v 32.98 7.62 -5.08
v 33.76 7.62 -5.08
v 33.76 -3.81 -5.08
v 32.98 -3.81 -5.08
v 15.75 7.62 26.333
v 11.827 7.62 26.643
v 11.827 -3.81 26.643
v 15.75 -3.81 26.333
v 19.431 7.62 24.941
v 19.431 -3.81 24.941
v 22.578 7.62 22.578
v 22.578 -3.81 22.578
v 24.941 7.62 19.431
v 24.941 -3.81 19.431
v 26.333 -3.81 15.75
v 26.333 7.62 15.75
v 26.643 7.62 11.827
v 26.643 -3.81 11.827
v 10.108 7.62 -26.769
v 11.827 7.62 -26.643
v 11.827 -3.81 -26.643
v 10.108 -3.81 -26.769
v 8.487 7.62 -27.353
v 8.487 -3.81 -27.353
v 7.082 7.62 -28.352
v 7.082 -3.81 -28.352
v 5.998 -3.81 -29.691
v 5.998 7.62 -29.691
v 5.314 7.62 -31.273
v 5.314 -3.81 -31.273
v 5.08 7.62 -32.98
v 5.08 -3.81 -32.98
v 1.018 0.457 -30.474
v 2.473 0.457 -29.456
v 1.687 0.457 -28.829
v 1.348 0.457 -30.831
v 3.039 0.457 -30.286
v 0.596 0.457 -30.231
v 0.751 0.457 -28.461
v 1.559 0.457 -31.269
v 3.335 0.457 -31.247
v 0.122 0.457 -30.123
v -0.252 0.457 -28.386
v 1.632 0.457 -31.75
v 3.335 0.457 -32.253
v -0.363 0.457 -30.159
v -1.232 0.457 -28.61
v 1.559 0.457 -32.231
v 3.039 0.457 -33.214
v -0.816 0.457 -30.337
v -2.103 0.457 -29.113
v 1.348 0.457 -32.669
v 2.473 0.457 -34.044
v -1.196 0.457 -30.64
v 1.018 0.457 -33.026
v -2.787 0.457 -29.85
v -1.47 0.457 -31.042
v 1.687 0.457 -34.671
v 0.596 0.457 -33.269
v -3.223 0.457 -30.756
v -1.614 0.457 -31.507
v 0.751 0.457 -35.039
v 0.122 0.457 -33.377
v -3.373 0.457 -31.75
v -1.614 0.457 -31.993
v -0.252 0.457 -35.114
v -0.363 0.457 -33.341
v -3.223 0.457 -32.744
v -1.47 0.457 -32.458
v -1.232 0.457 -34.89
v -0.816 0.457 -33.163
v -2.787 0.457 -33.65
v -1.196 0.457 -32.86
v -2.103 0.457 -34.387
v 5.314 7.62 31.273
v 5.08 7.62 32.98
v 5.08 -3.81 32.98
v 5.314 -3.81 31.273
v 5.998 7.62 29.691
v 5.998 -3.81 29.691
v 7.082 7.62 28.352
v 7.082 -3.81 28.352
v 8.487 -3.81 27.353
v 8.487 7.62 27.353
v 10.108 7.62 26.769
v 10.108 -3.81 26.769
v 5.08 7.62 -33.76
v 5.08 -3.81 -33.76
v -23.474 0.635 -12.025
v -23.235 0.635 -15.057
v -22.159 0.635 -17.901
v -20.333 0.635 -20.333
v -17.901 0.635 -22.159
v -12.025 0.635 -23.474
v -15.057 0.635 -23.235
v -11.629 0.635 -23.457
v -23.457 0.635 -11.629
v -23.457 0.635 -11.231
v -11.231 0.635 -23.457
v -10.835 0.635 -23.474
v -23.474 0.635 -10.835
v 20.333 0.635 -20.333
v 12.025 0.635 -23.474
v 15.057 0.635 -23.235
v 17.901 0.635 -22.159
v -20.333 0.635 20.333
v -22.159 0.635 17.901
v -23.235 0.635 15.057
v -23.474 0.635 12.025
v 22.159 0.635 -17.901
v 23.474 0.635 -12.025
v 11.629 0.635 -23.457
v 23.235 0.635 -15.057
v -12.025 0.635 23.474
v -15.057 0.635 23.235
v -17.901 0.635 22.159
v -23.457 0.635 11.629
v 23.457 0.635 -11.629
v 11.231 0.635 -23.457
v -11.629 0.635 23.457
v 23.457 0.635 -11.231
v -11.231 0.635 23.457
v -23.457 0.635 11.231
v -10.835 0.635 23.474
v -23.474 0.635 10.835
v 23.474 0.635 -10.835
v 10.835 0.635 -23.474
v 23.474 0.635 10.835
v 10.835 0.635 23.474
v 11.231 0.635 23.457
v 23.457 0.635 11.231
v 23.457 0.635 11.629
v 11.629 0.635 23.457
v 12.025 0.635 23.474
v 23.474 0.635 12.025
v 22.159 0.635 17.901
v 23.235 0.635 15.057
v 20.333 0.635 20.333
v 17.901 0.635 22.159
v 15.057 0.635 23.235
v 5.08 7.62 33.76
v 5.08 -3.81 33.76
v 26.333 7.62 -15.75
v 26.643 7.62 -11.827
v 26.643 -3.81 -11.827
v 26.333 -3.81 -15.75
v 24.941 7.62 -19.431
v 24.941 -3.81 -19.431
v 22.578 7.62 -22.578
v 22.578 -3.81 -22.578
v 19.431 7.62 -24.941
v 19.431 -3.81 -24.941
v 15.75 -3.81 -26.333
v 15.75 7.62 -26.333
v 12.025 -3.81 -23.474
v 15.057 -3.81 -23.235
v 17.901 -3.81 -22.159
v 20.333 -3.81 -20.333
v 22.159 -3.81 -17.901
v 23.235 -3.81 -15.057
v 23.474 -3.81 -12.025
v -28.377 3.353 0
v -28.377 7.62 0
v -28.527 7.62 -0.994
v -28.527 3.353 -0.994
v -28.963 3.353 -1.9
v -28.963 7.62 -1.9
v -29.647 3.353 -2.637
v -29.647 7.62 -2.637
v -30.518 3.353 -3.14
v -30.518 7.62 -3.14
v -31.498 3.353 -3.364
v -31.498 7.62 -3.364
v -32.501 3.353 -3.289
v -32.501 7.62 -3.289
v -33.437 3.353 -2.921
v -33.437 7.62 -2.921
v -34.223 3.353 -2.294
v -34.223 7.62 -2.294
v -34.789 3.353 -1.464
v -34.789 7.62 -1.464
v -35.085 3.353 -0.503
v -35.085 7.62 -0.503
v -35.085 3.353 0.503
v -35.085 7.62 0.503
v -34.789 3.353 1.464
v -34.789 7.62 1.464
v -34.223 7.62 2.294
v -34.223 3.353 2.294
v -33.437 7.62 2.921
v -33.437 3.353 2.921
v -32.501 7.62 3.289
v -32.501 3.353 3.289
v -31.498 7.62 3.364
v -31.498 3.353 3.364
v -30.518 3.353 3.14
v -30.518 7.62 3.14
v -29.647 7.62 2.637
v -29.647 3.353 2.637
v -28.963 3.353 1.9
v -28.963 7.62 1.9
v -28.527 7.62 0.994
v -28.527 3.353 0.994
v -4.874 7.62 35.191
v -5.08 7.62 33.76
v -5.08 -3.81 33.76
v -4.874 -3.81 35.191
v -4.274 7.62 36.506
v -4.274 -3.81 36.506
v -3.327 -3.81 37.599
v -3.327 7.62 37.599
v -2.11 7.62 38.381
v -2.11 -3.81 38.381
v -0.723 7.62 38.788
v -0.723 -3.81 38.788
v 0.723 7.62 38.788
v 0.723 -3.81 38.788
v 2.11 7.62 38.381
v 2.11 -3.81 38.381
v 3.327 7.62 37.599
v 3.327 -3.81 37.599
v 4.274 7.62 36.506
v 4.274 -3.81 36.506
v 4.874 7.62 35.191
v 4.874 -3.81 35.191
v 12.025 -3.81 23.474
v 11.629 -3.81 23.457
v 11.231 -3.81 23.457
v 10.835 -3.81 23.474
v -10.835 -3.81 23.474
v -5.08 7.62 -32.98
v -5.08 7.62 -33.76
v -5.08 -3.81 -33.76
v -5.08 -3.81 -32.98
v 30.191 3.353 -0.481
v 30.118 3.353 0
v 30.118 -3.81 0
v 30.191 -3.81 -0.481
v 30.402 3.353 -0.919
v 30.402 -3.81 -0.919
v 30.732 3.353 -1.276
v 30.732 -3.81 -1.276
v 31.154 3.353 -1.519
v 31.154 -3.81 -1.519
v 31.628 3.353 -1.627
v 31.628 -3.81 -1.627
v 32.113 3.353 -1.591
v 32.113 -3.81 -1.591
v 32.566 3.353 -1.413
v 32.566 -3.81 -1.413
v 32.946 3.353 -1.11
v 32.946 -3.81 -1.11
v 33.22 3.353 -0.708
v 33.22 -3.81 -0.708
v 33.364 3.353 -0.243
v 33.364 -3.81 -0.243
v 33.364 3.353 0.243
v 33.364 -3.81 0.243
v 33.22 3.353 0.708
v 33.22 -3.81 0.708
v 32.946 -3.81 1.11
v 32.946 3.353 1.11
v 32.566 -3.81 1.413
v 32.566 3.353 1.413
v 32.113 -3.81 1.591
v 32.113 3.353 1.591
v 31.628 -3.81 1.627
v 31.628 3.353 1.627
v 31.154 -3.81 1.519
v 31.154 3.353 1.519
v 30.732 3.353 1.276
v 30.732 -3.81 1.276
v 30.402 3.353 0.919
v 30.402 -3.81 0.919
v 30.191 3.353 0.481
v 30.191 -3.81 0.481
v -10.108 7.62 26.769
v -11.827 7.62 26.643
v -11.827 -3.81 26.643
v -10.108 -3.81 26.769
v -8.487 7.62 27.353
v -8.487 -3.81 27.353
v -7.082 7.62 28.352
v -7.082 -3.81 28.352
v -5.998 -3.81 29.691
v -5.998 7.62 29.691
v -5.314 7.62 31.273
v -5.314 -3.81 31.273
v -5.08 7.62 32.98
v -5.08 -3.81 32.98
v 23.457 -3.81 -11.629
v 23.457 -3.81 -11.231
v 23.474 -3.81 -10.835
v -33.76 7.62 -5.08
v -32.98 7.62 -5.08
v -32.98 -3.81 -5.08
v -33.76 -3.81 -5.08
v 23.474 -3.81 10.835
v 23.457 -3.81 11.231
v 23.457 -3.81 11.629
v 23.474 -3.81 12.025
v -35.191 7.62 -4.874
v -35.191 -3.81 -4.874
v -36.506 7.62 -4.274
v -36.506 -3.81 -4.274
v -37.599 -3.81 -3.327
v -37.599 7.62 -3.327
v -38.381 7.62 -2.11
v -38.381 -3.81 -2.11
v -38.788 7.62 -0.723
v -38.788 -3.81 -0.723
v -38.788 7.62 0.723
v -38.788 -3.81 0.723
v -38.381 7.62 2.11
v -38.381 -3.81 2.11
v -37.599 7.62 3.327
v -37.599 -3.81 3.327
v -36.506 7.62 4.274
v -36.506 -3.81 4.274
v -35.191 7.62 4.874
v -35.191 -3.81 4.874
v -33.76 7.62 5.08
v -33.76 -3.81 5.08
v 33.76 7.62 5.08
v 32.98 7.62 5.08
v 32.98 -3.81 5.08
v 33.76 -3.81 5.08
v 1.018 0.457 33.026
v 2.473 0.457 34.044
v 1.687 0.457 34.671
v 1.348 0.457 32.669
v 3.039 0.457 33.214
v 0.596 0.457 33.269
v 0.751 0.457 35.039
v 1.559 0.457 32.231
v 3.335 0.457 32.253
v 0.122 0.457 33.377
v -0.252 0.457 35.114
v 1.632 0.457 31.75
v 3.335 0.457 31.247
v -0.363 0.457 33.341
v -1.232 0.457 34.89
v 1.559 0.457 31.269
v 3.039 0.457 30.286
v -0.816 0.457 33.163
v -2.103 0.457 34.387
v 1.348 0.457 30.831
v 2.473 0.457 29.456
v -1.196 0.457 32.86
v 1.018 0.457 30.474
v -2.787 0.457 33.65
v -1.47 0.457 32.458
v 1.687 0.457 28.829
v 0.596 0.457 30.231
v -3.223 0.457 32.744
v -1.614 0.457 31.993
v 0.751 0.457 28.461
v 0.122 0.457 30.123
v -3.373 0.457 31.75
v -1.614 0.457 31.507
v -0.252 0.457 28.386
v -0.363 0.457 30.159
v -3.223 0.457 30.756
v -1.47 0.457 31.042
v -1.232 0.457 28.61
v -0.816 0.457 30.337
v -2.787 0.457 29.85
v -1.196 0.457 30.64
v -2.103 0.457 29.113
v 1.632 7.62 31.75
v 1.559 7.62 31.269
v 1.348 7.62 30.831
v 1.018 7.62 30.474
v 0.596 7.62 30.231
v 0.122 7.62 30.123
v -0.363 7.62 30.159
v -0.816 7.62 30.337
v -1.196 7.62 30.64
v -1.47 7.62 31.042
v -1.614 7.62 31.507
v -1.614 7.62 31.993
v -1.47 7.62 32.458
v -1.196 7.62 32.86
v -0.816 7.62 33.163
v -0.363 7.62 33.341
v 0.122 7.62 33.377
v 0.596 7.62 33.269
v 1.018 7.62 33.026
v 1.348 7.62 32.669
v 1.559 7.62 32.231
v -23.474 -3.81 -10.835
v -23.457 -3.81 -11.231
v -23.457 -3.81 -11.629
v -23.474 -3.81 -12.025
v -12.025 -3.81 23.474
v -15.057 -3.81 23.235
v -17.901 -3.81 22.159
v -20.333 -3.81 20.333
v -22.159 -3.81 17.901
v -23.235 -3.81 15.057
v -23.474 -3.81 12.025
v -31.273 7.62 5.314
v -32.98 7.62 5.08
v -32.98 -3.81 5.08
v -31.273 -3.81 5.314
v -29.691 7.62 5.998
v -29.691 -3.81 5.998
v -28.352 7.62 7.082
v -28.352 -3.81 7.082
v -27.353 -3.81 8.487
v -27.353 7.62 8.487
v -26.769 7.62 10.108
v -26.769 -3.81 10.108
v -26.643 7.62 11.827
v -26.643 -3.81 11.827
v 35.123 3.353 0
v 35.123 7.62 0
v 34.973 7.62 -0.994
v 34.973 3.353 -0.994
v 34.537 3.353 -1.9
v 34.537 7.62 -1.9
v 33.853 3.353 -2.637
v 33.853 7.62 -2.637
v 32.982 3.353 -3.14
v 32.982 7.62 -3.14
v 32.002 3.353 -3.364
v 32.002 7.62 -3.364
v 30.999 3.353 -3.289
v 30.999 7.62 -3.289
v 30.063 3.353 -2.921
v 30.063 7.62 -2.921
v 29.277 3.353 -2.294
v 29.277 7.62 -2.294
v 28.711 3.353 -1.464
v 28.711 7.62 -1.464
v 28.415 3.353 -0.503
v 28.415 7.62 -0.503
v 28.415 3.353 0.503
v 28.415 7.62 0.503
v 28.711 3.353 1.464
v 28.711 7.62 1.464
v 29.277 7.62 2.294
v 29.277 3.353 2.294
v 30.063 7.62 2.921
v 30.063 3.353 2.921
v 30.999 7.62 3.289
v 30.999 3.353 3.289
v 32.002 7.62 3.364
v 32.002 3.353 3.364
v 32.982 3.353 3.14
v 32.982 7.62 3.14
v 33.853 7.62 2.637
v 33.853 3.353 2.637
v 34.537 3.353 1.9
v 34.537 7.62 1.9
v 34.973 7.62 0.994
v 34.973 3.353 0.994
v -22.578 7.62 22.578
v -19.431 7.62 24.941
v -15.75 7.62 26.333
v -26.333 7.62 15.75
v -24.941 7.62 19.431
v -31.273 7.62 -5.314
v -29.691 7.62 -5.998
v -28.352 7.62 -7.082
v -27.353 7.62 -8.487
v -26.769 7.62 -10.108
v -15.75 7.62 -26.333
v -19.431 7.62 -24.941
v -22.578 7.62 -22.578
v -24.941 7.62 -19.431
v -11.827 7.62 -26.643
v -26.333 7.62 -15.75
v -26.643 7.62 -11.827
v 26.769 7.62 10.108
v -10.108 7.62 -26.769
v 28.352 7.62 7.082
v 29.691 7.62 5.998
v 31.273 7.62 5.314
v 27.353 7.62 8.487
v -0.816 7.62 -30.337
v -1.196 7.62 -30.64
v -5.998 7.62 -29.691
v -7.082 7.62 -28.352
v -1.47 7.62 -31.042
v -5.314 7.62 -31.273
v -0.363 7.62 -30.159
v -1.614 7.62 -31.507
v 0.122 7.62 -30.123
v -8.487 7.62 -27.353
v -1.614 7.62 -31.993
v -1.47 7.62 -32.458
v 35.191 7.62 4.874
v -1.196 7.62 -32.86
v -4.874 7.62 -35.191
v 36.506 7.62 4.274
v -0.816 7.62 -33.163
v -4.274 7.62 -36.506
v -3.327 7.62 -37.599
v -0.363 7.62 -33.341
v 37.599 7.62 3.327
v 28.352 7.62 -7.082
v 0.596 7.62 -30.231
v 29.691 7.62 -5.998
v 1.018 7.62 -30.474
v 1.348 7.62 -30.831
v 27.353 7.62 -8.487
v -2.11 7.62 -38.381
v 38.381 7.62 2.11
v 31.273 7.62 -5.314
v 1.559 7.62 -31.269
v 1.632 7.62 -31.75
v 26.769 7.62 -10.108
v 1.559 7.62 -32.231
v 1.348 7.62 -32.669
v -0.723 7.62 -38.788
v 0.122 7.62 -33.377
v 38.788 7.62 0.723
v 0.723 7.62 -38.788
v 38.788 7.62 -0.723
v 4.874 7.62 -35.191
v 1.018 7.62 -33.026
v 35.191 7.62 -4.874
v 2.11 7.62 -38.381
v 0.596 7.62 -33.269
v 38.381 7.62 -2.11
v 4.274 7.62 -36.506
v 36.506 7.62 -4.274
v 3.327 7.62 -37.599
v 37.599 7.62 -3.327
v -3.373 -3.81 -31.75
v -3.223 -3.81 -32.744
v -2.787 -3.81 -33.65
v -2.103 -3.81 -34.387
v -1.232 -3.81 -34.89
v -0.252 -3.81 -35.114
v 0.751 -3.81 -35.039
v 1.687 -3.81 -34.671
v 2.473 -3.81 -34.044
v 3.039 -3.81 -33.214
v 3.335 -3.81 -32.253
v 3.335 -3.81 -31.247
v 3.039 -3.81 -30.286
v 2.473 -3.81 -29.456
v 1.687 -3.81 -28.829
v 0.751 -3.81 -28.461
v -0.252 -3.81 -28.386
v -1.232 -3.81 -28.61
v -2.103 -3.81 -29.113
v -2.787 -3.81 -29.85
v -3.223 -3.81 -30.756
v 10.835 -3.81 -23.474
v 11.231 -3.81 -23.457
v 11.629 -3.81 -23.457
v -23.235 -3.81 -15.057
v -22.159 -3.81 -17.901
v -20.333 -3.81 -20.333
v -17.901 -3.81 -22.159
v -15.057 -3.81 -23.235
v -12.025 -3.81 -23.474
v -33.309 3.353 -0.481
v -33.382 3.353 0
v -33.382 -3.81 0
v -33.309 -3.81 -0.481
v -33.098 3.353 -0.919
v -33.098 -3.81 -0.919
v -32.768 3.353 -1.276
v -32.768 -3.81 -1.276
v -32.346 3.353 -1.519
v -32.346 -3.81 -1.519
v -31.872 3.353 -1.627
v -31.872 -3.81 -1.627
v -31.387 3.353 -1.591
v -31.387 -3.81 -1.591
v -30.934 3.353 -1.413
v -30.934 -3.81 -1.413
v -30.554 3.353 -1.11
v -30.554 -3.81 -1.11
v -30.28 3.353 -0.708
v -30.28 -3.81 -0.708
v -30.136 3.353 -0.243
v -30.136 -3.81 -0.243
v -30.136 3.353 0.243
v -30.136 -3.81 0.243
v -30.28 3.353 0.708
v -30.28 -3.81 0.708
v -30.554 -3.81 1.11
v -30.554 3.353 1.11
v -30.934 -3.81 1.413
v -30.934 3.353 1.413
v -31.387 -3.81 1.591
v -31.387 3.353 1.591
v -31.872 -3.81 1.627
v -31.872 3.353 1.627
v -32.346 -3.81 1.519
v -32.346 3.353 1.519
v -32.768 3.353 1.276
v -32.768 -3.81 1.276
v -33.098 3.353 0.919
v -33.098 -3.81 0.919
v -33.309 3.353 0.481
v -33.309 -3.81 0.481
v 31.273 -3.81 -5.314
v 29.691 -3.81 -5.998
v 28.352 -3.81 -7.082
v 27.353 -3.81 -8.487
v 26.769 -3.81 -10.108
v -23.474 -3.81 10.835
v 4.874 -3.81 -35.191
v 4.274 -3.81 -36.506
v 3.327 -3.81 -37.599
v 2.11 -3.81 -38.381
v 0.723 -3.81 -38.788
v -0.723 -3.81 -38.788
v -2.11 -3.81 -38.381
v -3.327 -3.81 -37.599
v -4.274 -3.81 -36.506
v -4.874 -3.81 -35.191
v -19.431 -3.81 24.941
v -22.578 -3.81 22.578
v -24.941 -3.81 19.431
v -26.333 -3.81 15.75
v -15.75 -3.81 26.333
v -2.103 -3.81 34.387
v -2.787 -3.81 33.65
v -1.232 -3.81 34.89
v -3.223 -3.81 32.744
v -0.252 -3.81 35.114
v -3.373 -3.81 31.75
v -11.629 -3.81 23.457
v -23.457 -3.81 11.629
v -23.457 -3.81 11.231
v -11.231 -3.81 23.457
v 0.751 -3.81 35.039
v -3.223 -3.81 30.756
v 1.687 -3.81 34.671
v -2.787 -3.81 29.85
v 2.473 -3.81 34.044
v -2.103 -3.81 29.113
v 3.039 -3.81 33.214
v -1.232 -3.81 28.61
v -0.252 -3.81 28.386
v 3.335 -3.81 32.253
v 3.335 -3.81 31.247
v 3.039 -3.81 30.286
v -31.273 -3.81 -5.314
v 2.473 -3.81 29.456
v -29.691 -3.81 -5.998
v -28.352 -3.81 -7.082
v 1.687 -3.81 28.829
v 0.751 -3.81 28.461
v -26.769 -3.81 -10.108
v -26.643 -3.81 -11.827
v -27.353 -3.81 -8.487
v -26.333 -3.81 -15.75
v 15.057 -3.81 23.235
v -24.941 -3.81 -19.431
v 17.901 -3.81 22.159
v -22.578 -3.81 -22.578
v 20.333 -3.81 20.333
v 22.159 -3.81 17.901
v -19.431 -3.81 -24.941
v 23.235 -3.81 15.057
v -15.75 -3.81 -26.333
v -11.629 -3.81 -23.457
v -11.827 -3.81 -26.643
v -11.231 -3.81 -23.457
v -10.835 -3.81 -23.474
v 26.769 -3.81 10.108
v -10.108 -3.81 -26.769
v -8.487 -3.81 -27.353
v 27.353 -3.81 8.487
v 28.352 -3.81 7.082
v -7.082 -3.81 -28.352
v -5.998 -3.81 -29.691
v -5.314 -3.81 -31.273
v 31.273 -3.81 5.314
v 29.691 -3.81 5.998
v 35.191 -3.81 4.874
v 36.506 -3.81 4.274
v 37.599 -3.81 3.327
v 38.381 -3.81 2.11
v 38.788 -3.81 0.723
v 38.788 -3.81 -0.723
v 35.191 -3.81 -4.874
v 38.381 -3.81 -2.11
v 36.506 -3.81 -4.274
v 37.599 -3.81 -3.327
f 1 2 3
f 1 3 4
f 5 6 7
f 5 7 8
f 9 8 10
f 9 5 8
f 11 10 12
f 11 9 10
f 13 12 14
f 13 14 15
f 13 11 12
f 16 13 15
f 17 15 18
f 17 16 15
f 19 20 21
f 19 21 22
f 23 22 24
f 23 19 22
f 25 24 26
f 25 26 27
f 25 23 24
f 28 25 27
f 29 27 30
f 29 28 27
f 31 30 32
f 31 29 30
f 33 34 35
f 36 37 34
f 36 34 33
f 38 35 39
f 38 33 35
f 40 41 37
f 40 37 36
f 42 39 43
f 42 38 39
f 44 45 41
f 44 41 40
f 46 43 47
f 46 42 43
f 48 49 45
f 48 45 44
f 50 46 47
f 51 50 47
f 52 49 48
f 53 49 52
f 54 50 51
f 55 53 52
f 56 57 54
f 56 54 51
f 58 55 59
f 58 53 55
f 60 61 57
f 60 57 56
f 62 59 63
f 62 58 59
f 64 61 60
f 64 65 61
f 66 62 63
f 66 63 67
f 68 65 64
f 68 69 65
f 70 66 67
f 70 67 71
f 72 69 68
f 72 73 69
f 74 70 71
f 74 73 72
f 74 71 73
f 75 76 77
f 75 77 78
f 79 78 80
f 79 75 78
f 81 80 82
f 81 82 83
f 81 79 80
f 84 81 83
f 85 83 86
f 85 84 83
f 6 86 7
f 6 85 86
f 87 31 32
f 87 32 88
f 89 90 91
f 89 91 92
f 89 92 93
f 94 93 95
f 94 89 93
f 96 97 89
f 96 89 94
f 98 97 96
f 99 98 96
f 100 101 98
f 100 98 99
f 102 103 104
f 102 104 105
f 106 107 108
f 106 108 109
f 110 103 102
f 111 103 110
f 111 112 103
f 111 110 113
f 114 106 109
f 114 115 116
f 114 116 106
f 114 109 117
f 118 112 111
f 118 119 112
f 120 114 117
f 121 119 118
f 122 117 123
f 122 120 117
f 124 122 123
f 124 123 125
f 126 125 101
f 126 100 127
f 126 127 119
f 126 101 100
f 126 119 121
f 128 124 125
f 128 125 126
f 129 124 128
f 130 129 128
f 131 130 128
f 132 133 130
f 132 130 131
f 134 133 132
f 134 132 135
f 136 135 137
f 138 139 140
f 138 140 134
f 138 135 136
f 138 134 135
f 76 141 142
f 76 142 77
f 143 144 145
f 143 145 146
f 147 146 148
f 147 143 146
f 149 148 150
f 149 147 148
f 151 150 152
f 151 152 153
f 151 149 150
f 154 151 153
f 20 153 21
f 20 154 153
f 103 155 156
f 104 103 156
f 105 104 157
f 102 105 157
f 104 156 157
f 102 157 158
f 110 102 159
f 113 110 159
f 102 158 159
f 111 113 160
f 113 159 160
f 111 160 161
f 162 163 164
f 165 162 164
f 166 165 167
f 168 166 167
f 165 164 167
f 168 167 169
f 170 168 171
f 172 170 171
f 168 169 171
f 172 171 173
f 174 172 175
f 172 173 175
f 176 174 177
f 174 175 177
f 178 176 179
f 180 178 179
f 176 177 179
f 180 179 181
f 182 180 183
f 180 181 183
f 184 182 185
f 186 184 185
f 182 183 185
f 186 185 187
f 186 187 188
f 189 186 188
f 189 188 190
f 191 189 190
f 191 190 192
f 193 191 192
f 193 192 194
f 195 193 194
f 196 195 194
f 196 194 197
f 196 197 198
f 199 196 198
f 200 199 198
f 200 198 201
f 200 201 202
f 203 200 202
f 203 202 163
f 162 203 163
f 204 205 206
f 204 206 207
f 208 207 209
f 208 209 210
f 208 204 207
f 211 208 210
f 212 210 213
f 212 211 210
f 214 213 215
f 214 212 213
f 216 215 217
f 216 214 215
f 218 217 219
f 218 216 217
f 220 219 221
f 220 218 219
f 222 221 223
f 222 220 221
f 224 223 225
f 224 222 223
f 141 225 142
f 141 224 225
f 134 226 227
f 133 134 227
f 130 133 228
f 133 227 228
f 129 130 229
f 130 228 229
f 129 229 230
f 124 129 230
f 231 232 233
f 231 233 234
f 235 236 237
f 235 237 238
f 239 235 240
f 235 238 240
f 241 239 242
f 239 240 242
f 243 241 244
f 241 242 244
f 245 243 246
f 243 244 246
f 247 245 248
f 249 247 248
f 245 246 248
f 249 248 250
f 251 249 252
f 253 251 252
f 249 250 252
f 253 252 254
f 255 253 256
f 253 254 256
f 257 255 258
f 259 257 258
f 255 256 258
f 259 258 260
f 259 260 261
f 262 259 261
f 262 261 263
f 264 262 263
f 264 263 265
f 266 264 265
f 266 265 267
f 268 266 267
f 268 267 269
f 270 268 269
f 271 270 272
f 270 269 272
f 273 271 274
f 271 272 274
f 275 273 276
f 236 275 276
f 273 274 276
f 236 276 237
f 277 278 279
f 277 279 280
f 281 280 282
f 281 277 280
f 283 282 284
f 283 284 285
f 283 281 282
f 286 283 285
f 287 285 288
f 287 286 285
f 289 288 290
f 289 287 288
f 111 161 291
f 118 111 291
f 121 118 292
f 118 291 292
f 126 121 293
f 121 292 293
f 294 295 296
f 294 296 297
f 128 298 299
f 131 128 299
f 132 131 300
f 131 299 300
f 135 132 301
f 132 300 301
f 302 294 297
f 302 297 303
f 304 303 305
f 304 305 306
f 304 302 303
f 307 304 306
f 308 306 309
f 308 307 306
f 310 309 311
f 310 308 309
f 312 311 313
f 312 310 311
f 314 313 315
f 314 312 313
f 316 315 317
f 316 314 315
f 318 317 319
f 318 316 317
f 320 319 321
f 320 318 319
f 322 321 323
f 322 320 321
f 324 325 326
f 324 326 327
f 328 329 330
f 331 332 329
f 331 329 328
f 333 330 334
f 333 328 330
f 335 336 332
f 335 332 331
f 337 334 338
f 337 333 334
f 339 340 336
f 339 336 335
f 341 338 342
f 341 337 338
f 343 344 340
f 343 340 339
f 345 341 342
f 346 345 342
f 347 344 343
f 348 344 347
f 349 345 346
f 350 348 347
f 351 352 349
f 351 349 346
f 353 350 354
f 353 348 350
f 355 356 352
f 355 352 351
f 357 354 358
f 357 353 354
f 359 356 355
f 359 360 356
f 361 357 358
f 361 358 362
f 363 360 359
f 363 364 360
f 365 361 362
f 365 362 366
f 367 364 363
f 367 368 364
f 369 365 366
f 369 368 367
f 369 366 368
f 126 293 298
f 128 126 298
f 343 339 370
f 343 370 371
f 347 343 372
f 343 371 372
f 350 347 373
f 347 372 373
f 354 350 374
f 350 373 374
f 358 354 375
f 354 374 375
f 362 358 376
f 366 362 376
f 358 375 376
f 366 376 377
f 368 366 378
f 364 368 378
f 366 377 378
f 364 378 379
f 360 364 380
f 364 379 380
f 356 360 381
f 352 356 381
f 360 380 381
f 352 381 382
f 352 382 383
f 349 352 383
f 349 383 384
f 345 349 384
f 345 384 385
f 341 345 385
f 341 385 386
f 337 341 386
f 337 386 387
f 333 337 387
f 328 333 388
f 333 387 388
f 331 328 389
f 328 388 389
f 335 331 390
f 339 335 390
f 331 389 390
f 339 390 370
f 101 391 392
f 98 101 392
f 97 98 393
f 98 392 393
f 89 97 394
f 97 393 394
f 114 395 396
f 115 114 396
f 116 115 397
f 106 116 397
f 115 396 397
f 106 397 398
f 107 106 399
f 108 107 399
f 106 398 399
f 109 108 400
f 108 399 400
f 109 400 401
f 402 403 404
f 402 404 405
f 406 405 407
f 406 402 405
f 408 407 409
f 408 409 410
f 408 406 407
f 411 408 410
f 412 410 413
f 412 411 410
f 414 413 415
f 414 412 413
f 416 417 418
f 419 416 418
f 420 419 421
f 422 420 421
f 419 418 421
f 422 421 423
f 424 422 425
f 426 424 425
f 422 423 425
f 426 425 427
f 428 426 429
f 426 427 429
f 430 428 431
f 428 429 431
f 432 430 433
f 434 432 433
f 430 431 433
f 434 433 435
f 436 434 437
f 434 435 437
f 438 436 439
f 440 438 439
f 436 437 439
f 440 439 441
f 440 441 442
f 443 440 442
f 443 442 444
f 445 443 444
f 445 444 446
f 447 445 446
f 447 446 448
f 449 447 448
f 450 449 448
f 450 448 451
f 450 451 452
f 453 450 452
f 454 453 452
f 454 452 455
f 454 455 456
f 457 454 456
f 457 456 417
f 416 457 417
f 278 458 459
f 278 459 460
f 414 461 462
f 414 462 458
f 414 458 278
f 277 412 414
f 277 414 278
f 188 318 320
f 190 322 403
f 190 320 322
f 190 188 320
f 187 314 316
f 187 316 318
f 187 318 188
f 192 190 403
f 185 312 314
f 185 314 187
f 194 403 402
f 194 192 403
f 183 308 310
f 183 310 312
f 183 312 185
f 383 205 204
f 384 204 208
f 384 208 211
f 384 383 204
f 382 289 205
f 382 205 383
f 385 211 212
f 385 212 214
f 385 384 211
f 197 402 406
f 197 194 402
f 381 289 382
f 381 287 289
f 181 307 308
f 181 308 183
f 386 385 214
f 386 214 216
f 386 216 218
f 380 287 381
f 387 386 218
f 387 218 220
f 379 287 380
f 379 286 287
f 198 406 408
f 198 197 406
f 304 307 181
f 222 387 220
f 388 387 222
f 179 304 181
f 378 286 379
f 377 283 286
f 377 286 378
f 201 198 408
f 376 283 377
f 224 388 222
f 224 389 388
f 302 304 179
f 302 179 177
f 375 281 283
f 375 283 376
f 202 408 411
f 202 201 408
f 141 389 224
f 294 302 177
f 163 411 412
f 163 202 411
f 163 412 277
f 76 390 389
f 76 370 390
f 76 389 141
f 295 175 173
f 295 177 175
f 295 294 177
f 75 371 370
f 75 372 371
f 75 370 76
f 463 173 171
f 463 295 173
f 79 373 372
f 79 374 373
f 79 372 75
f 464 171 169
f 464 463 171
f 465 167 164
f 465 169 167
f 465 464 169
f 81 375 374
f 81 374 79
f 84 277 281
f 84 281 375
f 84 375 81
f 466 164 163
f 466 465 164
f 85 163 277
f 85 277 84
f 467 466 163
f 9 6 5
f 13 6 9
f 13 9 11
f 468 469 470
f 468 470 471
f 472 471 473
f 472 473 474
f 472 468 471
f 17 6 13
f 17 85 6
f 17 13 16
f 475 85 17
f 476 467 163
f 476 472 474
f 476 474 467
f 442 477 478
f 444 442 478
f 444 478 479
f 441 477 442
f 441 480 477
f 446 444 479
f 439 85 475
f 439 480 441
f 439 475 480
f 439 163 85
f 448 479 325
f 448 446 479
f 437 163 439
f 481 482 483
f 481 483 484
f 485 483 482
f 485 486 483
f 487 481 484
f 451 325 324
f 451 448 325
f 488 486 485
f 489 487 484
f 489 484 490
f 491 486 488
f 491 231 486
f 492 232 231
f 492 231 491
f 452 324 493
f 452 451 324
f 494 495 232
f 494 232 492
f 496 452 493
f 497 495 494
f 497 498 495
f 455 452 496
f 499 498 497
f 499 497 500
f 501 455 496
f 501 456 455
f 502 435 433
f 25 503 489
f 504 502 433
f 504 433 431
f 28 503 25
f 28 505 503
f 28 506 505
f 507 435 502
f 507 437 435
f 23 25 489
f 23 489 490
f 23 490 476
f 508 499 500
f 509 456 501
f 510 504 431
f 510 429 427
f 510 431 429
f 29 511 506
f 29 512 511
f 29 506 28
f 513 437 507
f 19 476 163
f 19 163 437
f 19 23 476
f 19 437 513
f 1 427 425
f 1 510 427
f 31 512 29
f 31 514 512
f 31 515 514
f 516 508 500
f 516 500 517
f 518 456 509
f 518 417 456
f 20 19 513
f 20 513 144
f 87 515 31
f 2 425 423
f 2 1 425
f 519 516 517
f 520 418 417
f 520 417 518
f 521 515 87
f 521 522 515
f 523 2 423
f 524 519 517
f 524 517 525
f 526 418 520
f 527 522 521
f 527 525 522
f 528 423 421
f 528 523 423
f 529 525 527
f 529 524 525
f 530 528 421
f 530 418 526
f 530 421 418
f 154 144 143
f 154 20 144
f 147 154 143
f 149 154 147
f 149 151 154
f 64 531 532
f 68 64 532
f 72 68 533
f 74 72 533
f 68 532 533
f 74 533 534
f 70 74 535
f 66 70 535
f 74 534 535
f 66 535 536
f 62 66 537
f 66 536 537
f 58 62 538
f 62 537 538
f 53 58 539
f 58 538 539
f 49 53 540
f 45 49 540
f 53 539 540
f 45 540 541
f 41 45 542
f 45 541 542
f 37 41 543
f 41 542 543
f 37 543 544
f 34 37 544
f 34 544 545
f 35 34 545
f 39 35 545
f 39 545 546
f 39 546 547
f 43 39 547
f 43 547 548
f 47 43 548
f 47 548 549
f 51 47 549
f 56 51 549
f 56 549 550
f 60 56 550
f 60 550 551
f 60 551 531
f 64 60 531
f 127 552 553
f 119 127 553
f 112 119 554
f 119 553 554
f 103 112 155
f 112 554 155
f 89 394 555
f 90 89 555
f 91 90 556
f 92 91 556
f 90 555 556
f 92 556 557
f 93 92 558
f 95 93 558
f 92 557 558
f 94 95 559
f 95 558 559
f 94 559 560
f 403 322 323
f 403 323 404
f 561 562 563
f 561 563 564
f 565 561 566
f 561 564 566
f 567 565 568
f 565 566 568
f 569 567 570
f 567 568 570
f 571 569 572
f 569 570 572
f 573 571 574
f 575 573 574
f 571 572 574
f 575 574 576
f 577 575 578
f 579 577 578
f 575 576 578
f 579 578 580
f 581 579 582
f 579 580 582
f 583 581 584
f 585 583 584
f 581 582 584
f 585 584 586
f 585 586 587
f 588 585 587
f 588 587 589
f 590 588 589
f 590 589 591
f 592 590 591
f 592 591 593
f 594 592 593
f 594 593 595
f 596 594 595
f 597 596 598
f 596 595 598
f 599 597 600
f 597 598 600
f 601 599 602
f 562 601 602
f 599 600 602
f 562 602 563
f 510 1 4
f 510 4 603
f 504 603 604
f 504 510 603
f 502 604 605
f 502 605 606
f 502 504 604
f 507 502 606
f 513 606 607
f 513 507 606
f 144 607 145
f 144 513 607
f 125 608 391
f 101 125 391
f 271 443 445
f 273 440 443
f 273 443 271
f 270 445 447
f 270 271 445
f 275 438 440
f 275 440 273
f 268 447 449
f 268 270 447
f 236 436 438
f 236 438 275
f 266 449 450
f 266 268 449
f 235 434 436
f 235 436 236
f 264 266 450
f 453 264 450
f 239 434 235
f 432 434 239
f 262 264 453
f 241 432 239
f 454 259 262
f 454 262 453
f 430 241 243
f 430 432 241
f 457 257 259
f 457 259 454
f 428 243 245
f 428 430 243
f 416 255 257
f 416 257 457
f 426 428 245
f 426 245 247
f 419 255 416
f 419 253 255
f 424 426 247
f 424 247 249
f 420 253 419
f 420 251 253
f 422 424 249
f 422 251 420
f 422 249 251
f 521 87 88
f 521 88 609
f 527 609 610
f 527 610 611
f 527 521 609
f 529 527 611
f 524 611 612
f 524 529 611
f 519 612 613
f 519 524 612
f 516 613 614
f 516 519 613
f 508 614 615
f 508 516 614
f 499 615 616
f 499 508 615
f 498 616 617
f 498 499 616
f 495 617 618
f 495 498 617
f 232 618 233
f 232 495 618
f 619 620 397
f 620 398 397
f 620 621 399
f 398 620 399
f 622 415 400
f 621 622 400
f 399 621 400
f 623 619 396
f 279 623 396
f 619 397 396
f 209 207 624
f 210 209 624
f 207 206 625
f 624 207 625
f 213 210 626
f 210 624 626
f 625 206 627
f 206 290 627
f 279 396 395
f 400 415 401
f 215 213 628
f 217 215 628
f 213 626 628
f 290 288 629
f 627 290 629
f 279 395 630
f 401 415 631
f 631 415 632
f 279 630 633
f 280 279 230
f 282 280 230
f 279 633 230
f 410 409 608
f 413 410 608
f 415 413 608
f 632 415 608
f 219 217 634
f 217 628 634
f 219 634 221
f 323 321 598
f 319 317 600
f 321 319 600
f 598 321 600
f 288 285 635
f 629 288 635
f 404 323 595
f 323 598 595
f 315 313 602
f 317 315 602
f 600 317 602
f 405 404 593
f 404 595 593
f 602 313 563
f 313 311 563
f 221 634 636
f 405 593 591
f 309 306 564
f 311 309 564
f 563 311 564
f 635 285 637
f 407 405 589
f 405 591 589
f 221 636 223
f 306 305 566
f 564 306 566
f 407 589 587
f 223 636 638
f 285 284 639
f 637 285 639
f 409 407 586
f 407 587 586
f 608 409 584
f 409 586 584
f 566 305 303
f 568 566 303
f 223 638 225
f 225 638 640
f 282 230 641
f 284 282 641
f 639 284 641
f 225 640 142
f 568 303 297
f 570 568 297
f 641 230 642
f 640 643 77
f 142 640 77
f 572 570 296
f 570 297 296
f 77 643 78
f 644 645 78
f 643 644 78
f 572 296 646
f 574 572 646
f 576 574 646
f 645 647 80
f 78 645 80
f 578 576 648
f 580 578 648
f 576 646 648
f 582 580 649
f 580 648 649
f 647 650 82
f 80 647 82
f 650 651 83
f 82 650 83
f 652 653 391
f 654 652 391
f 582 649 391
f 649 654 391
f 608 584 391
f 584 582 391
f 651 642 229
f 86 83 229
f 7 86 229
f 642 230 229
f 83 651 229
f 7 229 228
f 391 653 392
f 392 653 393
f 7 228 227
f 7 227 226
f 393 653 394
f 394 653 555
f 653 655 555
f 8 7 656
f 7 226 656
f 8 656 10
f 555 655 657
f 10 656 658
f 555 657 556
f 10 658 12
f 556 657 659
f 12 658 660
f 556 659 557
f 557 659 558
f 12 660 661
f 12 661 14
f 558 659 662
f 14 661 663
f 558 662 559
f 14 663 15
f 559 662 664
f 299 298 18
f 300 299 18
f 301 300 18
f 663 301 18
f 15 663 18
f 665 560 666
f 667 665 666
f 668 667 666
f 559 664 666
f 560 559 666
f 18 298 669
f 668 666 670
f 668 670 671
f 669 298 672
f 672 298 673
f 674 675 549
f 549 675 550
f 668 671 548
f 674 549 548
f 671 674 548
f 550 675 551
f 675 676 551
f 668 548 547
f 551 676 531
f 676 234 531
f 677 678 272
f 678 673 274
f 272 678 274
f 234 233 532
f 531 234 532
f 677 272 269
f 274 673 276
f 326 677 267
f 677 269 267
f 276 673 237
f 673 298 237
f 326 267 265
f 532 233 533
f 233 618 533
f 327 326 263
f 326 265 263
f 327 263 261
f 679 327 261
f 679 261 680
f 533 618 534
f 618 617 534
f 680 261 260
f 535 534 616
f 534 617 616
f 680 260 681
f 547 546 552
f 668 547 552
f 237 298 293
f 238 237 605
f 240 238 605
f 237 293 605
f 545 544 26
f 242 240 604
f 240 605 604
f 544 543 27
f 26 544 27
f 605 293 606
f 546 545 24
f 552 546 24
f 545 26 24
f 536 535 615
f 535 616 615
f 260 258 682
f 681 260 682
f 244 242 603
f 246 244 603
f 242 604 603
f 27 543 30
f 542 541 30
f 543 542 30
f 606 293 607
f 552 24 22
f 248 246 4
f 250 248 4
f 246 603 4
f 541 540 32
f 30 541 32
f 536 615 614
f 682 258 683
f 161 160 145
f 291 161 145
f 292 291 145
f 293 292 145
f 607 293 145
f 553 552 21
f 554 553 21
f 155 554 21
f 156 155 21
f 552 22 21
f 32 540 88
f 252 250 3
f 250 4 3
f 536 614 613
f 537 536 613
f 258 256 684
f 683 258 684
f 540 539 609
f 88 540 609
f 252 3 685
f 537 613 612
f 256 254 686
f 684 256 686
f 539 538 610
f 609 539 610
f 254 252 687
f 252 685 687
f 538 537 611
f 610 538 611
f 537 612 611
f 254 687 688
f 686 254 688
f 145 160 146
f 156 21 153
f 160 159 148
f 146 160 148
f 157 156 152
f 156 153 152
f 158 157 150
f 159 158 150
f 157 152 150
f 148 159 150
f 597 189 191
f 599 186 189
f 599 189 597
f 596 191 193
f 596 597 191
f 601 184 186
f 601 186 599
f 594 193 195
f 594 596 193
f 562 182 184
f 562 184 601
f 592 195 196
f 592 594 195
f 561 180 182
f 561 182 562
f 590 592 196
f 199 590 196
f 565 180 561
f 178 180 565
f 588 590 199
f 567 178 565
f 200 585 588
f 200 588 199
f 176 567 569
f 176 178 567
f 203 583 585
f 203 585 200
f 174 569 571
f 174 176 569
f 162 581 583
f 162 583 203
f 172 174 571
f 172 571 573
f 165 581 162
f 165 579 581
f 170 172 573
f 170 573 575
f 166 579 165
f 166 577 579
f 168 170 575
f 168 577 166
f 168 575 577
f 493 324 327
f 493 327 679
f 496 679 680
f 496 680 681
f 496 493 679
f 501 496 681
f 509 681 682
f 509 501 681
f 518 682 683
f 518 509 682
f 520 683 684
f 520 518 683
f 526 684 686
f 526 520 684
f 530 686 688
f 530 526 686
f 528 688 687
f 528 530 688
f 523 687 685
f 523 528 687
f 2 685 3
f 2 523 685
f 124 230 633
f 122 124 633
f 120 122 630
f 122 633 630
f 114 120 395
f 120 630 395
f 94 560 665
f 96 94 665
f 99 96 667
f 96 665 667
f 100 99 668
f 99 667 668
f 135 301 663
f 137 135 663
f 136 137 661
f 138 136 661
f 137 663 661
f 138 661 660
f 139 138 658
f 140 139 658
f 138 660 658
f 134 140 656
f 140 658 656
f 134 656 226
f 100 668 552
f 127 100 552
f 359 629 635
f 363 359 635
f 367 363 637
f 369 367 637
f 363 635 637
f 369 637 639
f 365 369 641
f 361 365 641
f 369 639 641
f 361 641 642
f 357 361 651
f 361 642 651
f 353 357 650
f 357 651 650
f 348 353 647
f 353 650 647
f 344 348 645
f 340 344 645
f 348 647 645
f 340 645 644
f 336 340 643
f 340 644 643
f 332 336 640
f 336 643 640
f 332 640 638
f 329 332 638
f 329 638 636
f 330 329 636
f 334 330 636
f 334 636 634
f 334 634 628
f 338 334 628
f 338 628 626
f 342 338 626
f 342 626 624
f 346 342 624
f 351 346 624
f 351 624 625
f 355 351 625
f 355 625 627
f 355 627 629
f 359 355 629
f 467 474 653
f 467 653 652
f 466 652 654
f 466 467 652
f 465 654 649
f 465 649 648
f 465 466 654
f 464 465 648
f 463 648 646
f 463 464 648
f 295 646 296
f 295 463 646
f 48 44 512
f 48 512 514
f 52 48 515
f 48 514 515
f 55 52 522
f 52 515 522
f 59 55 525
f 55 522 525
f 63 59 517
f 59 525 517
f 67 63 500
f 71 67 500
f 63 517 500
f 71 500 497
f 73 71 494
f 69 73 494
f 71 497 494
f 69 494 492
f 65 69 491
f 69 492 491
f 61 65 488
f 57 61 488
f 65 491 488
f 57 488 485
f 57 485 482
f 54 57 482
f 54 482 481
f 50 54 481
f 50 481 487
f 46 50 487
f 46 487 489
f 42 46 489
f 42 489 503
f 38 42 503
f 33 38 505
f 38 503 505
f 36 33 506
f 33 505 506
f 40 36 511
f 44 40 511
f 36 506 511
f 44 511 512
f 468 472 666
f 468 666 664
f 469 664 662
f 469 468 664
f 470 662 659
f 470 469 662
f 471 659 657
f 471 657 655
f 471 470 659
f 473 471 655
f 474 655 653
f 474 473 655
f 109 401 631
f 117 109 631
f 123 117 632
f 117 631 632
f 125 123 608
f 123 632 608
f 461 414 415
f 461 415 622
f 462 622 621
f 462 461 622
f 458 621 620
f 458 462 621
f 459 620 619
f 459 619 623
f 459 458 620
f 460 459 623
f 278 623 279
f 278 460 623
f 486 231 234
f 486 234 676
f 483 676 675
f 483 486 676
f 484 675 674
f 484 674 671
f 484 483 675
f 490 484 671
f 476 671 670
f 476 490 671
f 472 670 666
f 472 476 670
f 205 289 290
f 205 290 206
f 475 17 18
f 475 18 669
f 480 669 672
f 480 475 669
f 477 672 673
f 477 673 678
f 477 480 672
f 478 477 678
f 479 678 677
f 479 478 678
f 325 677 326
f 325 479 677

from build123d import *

# Parameters (mm, degrees)
BOSS_EXTRUDE4_DEPTH                                 = 3.81
BOSS_EXTRUDE4_DEPTH_BACK                            = 7.62
CUT_EXTRUDE1_DEPTH                                  = 4.445
CBORE_FOR_4_BINDING_HEAD_MACHINE_SCREW3_D           = 3.2639
CBORE_FOR_4_BINDING_HEAD_MACHINE_SCREW3_CBORE_D     = 6.74624
CBORE_FOR_4_BINDING_HEAD_MACHINE_SCREW3_CBORE_DEPTH = 4.2672
CBORE_FOR_4_BINDING_HEAD_MACHINE_SCREW4_D           = 3.2639
CBORE_FOR_4_BINDING_HEAD_MACHINE_SCREW4_CBORE_D     = 6.74624
CBORE_FOR_4_BINDING_HEAD_MACHINE_SCREW4_CBORE_DEPTH = 4.2672


with BuildPart() as part:
    # Sketch5 → Boss-Extrude4 (new, two sides: drawn at the far end of the back side and taken through both)
    with BuildSketch(Plane(origin=(0, 0, 0), x_dir=(-1, 0, 0), z_dir=(0, -1, 0)).offset(-BOSS_EXTRUDE4_DEPTH_BACK)):
        with BuildLine():
            Line((33.759871133, -5.08), (32.980273667, -5.08))
            ThreePointArc((32.980273667, -5.08), (28.3519556, -7.0824522), (26.642688146, -11.826875))
            ThreePointArc((26.642688146, -11.826875), (22.578281733, -22.578281733), (11.826875, -26.642688146))
            ThreePointArc((11.826875, -26.642688146), (7.0824522, -28.3519556), (5.08, -32.980273667))
            Line((5.08, -32.980273667), (5.08, -33.759871133))
            ThreePointArc((5.08, -33.759871133), (0, -38.839871133), (-5.08, -33.759871133))
            Line((-5.08, -33.759871133), (-5.08, -32.980273667))
            ThreePointArc((-5.08, -32.980273667), (-7.0824522, -28.3519556), (-11.826875, -26.642688146))
            ThreePointArc((-11.826875, -26.642688146), (-22.578281733, -22.578281733), (-26.642688146, -11.826875))
            ThreePointArc((-26.642688146, -11.826875), (-28.3519556, -7.0824522), (-32.980273667, -5.08))
            Line((-32.980273667, -5.08), (-33.759871133, -5.08))
            ThreePointArc((-33.759871133, -5.08), (-38.839871133, 0), (-33.759871133, 5.08))
            Line((-33.759871133, 5.08), (-32.980273667, 5.08))
            ThreePointArc((-32.980273667, 5.08), (-28.3519556, 7.0824522), (-26.642688146, 11.826875))
            ThreePointArc((-26.642688146, 11.826875), (-22.578281733, 22.578281733), (-11.826875, 26.642688146))
            ThreePointArc((-11.826875, 26.642688146), (-7.0824522, 28.3519556), (-5.08, 32.980273667))
            Line((-5.08, 32.980273667), (-5.08, 33.759871133))
            ThreePointArc((-5.08, 33.759871133), (0, 38.839871133), (5.08, 33.759871133))
            Line((5.08, 33.759871133), (5.08, 32.980273667))
            ThreePointArc((5.08, 32.980273667), (7.0824522, 28.3519556), (11.826875, 26.642688146))
            ThreePointArc((11.826875, 26.642688146), (22.578281733, 22.578281733), (26.642688146, 11.826875))
            ThreePointArc((26.642688146, 11.826875), (28.3519556, 7.0824522), (32.980273667, 5.08))
            Line((32.980273667, 5.08), (33.759871133, 5.08))
            ThreePointArc((33.759871133, 5.08), (38.839871133, 0), (33.759871133, -5.08))
        make_face()
    extrude(amount=BOSS_EXTRUDE4_DEPTH + BOSS_EXTRUDE4_DEPTH_BACK)

    # Sketch21 → Cut-Extrude1 (cut)
    with BuildSketch(Plane.XZ.offset(3.81)):
        with BuildLine():
            ThreePointArc((23.473895385, 12.0253125), (20.333217703, 20.333217703), (12.0253125, 23.473895385))
            ThreePointArc((12.0253125, 23.473895385), (11.43, 23.455273667), (10.8346875, 23.473895385))
            Line((10.8346875, 23.473895385), (-10.8346875, 23.473895385))
            ThreePointArc((-10.8346875, 23.473895385), (-11.43, 23.455273667), (-12.0253125, 23.473895385))
            ThreePointArc((-12.0253125, 23.473895385), (-20.333217703, 20.333217703), (-23.473895385, 12.0253125))
            ThreePointArc((-23.473895385, 12.0253125), (-23.455273667, 11.43), (-23.473895385, 10.8346875))
            Line((-23.473895385, 10.8346875), (-23.473895385, -10.8346875))
            ThreePointArc((-23.473895385, -10.8346875), (-23.455273667, -11.43), (-23.473895385, -12.0253125))
            ThreePointArc((-23.473895385, -12.0253125), (-20.333217703, -20.333217703), (-12.0253125, -23.473895385))
            ThreePointArc((-12.0253125, -23.473895385), (-11.43, -23.455273667), (-10.8346875, -23.473895385))
            Line((-10.8346875, -23.473895385), (10.8346875, -23.473895385))
            ThreePointArc((10.8346875, -23.473895385), (11.43, -23.455273667), (12.0253125, -23.473895385))
            ThreePointArc((12.0253125, -23.473895385), (20.333217703, -20.333217703), (23.473895385, -12.0253125))
            ThreePointArc((23.473895385, -12.0253125), (23.455273667, -11.43), (23.473895385, -10.8346875))
            Line((23.473895385, -10.8346875), (23.473895385, 10.8346875))
            ThreePointArc((23.473895385, 10.8346875), (23.455273667, 11.43), (23.473895385, 12.0253125))
        make_face()
    extrude(amount=-CUT_EXTRUDE1_DEPTH, mode=Mode.SUBTRACT)

    # CBORE for #4 Binding Head Machine Screw3 (through all)
    with Locations(Plane(origin=(0, -3.81, 0), x_dir=(-1, 0, 0), z_dir=(0, -1, 0))):
        with Locations((0, 31.75), (0, -31.75)):
            CounterBoreHole(CBORE_FOR_4_BINDING_HEAD_MACHINE_SCREW3_D / 2, CBORE_FOR_4_BINDING_HEAD_MACHINE_SCREW3_CBORE_D / 2, CBORE_FOR_4_BINDING_HEAD_MACHINE_SCREW3_CBORE_DEPTH)

    # CBORE for #4 Binding Head Machine Screw4 (through all)
    with Locations(Plane(origin=(0, 7.62, 0), x_dir=(1, 0, 0), z_dir=(0, 1, 0))):
        with Locations((31.75, 0), (-31.75, 0)):
            CounterBoreHole(CBORE_FOR_4_BINDING_HEAD_MACHINE_SCREW4_D / 2, CBORE_FOR_4_BINDING_HEAD_MACHINE_SCREW4_CBORE_D / 2, CBORE_FOR_4_BINDING_HEAD_MACHINE_SCREW4_CBORE_DEPTH)


solid = part.part
